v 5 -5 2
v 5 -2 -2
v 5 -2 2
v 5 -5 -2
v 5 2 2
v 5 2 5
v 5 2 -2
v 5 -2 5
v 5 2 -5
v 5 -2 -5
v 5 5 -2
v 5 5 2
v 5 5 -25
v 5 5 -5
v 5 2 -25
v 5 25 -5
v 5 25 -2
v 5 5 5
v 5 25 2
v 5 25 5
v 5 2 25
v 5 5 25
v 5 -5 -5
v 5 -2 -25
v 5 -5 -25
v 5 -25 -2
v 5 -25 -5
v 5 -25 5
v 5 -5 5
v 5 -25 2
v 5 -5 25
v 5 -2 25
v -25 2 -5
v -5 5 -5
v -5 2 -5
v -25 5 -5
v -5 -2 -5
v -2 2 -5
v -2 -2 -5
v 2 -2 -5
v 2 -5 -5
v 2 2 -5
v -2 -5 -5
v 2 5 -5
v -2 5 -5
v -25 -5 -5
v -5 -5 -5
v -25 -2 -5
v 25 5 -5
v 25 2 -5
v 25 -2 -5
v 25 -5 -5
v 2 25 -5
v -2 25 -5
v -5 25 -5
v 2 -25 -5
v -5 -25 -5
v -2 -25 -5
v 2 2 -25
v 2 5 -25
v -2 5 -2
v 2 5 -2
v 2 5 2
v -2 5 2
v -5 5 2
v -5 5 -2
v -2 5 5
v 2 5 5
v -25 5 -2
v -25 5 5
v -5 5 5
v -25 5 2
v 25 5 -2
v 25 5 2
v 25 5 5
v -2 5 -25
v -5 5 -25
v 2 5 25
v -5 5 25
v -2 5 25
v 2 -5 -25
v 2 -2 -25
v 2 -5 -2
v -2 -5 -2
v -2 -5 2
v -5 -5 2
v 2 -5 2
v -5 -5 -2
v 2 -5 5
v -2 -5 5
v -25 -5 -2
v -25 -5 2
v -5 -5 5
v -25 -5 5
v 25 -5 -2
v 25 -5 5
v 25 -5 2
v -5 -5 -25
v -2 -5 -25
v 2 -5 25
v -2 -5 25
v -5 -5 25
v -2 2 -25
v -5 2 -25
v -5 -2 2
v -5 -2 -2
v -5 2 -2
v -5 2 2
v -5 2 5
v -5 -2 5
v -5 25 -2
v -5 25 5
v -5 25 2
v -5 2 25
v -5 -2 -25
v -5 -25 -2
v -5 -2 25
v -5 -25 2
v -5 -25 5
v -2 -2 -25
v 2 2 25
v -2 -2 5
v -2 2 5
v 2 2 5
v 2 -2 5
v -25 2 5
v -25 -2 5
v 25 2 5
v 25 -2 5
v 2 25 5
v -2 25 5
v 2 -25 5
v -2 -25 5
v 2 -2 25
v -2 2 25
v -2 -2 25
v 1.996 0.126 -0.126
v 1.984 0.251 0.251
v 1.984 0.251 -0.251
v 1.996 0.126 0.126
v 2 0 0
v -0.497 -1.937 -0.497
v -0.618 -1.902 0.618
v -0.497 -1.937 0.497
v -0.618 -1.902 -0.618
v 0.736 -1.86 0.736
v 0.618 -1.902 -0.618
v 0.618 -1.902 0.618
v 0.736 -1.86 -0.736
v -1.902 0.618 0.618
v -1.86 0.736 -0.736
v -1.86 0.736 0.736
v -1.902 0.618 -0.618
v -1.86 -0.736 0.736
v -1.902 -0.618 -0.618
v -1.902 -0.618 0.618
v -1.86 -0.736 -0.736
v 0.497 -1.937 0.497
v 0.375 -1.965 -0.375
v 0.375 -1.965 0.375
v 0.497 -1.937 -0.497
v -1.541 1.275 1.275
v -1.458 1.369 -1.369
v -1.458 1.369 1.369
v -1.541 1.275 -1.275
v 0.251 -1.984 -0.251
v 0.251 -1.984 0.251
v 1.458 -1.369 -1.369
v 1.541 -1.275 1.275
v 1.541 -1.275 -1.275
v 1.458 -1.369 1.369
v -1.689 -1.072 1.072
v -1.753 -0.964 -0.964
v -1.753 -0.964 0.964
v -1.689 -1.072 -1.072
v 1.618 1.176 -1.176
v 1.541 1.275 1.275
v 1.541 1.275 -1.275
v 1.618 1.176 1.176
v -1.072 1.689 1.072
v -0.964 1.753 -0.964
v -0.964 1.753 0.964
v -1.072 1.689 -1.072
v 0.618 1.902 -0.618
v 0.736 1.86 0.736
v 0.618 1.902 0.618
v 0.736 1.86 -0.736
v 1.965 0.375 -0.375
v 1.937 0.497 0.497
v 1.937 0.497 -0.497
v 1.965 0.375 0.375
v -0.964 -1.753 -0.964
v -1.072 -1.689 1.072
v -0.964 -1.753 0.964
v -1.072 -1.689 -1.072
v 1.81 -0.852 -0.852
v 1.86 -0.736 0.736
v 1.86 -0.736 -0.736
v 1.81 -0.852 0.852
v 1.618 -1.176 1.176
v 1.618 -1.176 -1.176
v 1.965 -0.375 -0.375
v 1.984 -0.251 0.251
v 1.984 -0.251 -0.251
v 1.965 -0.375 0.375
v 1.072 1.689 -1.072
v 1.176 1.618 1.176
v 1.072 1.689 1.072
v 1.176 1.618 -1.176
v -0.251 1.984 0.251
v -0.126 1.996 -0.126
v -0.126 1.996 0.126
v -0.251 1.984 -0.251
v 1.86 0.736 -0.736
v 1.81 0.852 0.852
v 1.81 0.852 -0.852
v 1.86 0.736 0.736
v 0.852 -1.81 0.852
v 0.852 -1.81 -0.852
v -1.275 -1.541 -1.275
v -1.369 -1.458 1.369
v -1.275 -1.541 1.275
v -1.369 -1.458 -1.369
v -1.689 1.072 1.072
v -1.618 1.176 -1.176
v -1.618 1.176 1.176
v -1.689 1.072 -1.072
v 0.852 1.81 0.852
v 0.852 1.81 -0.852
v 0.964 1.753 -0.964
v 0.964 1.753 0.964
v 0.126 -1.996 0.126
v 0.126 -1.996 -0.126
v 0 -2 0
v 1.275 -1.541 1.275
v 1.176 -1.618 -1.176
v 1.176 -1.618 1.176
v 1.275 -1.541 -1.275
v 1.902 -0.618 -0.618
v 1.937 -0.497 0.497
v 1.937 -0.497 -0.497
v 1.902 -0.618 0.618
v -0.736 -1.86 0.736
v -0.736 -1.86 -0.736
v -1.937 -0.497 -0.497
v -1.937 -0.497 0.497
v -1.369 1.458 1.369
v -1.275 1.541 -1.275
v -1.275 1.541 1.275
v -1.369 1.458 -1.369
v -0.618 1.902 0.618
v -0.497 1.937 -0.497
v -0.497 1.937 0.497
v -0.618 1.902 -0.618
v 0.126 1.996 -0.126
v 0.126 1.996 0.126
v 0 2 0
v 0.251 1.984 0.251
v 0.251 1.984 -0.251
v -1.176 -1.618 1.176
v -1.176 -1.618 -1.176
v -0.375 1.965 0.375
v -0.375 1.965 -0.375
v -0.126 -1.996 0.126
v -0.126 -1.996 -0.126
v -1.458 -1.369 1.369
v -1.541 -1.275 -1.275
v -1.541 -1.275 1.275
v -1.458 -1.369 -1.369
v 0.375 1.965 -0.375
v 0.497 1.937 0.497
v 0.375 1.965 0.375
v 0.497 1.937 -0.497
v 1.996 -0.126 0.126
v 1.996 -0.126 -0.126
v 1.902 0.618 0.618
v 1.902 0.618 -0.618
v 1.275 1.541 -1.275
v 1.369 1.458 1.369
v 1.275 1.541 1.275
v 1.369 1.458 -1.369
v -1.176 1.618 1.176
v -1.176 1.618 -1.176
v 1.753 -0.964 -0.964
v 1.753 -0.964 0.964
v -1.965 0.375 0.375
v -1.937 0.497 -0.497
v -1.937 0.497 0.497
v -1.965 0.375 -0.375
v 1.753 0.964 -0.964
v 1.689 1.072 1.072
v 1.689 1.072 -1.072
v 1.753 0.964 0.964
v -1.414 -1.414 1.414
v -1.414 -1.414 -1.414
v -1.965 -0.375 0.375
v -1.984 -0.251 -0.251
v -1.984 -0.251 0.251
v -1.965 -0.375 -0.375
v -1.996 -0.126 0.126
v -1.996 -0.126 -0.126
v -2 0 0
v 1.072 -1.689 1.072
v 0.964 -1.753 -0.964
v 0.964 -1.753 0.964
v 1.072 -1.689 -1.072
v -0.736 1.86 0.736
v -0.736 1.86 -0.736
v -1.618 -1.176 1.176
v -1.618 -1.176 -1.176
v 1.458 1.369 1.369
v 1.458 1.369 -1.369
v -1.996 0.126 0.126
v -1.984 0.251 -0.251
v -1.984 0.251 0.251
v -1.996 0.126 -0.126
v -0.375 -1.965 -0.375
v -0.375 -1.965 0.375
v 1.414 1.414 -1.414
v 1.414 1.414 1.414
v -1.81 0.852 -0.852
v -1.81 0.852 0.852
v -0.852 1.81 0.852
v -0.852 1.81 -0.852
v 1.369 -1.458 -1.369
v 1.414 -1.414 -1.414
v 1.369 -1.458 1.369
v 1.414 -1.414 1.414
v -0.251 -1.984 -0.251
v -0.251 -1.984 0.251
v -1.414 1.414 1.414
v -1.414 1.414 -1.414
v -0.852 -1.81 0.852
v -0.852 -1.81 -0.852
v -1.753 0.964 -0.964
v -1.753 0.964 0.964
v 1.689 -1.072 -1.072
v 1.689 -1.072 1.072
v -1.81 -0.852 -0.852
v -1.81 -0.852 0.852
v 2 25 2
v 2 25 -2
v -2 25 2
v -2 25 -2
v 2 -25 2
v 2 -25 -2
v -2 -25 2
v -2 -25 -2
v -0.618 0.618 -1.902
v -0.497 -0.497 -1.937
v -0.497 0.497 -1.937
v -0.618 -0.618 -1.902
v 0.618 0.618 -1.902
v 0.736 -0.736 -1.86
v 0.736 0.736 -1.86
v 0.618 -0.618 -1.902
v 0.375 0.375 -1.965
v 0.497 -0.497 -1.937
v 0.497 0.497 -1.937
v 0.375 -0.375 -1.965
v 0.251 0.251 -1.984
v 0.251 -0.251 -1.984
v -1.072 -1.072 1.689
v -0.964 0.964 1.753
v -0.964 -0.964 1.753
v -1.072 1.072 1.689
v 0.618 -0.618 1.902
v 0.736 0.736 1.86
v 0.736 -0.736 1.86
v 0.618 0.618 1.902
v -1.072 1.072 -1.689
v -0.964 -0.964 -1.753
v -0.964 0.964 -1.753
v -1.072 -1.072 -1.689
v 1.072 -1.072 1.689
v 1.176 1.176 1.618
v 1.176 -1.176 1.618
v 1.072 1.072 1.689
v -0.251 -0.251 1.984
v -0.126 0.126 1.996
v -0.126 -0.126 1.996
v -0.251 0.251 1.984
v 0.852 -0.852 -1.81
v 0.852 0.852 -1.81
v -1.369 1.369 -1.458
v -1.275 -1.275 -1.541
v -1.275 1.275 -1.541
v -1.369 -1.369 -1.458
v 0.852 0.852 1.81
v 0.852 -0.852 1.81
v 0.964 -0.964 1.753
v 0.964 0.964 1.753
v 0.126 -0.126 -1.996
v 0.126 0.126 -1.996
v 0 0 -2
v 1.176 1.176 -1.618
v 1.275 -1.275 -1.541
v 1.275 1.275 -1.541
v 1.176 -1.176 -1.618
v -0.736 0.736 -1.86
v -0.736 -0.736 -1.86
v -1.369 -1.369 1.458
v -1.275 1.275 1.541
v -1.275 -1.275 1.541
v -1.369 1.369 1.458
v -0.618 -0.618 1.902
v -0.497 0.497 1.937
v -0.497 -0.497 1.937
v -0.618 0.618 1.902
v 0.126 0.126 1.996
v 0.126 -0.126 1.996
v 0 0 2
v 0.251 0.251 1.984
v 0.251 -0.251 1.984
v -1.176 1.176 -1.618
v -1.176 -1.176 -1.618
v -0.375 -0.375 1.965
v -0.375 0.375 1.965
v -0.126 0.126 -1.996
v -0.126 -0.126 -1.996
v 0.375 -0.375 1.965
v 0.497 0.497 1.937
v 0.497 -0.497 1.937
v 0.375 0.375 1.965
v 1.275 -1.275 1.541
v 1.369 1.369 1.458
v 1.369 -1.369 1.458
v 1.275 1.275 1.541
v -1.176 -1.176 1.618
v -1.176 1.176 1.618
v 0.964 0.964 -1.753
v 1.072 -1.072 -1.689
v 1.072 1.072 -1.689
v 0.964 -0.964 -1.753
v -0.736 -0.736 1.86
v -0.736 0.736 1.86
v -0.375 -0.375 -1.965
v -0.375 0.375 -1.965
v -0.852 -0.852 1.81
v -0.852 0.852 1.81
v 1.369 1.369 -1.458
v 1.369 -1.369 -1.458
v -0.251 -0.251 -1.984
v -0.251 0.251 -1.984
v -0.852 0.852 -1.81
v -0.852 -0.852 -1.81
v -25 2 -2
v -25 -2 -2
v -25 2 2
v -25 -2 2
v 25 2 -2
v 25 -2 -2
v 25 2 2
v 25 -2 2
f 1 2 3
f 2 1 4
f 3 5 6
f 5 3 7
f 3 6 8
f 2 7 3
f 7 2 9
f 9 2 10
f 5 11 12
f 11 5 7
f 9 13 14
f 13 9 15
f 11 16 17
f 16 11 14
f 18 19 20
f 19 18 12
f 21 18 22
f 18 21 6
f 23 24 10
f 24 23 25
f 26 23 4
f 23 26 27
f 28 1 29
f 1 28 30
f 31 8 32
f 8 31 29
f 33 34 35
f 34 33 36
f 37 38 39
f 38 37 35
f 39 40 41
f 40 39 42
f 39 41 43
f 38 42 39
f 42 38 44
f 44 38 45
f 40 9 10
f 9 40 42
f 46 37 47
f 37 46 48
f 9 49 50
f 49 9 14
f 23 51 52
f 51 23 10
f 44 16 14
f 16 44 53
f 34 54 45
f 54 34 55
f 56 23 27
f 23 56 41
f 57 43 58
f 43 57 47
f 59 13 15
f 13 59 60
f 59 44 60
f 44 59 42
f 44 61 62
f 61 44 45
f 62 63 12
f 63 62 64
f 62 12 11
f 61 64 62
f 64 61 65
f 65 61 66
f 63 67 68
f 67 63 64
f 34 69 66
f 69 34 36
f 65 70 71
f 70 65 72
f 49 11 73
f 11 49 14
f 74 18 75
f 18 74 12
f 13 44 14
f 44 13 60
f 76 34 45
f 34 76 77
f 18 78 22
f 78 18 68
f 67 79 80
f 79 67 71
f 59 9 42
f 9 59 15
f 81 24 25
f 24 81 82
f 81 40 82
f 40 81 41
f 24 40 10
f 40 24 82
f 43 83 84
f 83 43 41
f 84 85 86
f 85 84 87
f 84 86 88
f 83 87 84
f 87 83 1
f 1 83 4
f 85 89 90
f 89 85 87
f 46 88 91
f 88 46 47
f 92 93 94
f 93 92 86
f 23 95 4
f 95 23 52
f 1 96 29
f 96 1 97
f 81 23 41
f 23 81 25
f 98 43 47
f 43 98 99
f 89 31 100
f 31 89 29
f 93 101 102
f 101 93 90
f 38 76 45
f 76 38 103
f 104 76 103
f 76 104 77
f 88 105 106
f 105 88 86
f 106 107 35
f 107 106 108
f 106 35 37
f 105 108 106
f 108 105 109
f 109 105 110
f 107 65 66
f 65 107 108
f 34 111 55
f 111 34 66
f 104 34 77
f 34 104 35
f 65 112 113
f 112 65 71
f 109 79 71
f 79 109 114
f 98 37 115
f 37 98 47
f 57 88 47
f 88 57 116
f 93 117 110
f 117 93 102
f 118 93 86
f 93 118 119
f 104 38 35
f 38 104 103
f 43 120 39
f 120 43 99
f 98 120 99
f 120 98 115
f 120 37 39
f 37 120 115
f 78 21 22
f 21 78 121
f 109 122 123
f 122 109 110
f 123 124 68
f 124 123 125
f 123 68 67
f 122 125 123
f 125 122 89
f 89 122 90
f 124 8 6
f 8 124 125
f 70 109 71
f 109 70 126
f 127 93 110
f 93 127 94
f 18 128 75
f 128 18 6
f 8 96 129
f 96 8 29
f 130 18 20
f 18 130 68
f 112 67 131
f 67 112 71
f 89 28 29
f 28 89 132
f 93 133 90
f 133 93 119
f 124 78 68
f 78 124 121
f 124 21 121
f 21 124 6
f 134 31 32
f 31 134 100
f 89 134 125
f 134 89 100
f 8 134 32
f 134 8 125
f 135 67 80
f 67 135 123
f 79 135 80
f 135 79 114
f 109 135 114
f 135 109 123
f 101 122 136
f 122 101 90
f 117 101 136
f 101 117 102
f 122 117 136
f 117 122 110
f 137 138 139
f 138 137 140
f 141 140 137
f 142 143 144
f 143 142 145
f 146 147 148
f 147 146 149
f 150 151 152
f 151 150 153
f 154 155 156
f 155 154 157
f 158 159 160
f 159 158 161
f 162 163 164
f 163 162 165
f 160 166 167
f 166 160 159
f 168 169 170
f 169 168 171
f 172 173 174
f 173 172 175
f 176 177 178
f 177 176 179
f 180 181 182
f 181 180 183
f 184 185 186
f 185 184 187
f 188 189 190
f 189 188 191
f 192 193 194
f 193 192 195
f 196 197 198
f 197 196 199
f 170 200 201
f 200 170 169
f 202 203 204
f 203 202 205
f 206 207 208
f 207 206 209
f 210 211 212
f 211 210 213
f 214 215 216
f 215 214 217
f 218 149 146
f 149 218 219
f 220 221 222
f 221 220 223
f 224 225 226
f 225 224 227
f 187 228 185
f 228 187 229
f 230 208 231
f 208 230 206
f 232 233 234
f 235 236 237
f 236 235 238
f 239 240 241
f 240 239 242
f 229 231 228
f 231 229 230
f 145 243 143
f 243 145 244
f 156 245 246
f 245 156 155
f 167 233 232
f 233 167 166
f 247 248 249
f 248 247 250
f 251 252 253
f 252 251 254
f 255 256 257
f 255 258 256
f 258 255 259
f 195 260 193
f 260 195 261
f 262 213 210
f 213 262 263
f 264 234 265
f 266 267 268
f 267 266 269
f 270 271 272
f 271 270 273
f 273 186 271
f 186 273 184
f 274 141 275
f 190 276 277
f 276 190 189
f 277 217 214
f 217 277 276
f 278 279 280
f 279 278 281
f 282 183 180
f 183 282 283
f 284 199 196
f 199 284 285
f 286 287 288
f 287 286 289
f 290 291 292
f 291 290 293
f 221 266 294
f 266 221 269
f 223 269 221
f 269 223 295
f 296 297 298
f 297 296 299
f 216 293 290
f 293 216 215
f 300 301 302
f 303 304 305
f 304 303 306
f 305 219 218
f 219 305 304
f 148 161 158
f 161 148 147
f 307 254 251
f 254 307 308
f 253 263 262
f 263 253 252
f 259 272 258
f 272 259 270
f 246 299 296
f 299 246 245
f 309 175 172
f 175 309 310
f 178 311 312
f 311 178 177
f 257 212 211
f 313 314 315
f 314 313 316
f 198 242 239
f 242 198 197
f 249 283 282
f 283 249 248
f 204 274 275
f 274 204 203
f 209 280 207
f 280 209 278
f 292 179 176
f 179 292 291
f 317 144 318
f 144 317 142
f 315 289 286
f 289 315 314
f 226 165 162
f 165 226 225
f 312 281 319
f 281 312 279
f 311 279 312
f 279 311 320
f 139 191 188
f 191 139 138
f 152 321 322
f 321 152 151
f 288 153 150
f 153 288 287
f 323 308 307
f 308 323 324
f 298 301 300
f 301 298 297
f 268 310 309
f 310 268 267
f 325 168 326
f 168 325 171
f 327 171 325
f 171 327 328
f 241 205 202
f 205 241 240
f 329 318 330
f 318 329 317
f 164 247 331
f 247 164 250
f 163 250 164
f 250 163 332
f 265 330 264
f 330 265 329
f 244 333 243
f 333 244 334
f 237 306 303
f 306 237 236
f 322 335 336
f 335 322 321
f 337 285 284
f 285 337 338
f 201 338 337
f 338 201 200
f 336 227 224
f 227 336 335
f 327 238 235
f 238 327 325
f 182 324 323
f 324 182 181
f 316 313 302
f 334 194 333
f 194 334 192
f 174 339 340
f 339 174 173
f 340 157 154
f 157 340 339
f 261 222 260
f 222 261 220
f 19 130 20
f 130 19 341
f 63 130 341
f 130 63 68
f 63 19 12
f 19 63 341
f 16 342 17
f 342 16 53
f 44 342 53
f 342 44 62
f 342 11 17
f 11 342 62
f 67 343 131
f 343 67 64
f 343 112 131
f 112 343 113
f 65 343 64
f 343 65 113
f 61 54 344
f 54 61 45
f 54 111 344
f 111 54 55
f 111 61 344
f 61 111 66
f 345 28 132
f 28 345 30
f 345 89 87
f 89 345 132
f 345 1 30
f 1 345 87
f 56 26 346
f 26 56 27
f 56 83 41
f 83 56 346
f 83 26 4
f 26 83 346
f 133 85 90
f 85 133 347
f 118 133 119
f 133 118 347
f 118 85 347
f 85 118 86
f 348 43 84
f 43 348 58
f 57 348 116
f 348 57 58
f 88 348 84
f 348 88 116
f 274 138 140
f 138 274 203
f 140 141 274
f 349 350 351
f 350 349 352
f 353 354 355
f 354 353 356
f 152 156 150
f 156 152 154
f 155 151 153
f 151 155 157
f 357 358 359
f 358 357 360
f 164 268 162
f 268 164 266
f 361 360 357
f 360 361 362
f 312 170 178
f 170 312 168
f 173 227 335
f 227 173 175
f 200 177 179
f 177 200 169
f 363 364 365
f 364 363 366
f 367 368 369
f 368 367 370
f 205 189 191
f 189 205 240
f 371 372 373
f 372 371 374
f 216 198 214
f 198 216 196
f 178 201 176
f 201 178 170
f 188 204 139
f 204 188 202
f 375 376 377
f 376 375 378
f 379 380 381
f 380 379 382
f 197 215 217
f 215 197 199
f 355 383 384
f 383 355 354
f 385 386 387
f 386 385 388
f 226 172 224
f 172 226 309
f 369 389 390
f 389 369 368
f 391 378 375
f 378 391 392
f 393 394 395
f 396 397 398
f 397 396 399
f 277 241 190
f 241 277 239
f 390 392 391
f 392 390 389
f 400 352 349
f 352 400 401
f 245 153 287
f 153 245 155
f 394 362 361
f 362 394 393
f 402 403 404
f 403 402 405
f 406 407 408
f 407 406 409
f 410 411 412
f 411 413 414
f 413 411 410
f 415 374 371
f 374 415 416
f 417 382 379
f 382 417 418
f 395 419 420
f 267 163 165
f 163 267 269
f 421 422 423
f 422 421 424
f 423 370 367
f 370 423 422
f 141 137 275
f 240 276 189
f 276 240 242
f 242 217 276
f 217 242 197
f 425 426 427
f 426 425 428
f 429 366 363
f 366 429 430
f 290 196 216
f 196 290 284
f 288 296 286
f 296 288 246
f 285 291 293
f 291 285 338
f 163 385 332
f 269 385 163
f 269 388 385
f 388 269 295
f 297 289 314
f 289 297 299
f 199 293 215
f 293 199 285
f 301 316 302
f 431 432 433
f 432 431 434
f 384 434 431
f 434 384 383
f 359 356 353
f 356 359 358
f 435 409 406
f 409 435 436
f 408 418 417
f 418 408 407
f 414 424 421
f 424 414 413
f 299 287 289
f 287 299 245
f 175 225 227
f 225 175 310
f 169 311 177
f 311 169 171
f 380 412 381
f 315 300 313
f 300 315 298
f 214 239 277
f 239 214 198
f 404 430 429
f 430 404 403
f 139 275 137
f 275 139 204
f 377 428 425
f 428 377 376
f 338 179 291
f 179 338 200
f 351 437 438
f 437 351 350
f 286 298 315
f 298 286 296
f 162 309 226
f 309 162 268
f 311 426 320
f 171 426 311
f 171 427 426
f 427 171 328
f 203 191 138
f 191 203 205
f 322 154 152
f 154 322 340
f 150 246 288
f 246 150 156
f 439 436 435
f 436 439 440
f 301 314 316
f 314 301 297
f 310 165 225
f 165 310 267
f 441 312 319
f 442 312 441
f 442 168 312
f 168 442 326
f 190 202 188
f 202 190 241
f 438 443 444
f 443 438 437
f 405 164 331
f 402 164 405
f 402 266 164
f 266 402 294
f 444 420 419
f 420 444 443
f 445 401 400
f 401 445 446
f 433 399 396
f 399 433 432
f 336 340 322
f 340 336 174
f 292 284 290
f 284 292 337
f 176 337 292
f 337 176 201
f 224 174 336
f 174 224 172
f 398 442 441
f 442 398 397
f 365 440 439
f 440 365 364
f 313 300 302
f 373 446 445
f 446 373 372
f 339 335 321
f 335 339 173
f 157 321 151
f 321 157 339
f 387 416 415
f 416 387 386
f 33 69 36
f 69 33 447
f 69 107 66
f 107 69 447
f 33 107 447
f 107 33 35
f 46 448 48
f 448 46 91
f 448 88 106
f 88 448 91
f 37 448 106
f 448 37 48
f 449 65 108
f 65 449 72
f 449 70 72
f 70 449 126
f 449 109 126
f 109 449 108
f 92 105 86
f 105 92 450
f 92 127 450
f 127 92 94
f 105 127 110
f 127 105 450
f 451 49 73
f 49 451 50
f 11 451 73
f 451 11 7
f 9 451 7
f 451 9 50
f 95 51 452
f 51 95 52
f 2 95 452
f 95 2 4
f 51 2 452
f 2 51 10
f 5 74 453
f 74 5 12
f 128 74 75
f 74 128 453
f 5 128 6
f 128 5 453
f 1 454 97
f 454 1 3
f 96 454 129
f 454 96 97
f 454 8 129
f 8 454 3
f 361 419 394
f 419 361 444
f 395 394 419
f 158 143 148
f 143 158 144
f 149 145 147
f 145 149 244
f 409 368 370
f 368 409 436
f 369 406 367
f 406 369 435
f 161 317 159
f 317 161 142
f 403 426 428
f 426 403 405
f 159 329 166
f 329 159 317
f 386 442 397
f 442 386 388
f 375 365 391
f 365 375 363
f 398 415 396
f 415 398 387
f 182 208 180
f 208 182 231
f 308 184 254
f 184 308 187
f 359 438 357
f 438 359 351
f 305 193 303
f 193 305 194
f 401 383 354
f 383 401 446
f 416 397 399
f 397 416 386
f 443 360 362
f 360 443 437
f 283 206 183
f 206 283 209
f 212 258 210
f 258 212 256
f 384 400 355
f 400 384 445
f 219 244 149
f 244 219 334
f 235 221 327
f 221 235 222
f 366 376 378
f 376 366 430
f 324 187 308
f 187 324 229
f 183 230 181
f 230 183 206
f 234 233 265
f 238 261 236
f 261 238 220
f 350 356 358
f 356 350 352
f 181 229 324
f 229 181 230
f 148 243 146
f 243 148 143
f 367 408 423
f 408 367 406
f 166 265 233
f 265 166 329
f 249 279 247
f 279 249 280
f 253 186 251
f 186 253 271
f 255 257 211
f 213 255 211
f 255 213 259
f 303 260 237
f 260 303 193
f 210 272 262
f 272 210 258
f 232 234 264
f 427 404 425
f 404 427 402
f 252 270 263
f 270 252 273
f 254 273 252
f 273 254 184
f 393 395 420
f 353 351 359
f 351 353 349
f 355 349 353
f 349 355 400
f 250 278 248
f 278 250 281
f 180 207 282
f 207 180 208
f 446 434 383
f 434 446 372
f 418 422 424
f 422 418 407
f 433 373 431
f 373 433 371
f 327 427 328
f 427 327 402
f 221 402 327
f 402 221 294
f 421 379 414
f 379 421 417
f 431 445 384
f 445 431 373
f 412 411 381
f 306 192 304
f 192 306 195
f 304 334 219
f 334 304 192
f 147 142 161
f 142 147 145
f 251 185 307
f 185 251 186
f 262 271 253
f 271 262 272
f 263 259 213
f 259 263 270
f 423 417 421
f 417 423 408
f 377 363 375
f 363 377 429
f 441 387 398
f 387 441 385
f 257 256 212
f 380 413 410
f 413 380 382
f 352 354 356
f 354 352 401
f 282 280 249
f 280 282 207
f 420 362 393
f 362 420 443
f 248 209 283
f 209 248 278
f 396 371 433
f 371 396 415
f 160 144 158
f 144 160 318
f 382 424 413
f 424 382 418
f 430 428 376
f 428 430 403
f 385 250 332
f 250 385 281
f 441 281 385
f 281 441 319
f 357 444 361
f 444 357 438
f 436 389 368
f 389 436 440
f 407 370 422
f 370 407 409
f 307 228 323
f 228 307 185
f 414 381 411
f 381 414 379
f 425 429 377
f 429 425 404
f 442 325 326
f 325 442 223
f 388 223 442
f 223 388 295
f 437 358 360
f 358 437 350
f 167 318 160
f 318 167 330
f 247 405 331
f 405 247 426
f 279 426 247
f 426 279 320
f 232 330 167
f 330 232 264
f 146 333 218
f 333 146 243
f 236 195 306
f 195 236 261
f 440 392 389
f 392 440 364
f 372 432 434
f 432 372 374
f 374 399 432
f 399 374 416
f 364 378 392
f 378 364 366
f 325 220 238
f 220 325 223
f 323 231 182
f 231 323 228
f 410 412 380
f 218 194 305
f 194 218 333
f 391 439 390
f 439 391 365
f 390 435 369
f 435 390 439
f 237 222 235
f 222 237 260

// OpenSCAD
tooth_width = 3;
tooth_height = 20;
base_height = 10;
base_width = 10;
$fn = 100;
module connector(tooth_width, tooth_height, base_width, base_height) {
	corner_offset = (base_width-tooth_width)/2;
	height_offset = tooth_height/2+base_height/2;
	corner_positions = [
		[corner_offset, corner_offset, 0],
		[corner_offset, -corner_offset, 0],
		[-corner_offset, corner_offset, 0],
		[-corner_offset, -corner_offset, 0]
		];
	difference(){
		union(){
			for (i=[-1:2:1]) {
				for (j=[0:1:3]){
					translate([0, 0, i*height_offset])
						translate(corner_positions[j])
							cube([tooth_width, tooth_width, tooth_height], center=true);
				}
			}
			//teeth top
			//base
			cube([base_width, base_width, base_height], center=true);
		}
		cylinder(r=(base_width-2*tooth_width)/2, h=base_height, center=true);
	}
}

union(){
	connector(tooth_width, tooth_height, base_width, base_height);
	rotate([90, 0, 0])connector(tooth_width,tooth_height, base_width,base_height);
	rotate([0, 90, 0])connector(tooth_width,tooth_height, base_width,base_height);
}
